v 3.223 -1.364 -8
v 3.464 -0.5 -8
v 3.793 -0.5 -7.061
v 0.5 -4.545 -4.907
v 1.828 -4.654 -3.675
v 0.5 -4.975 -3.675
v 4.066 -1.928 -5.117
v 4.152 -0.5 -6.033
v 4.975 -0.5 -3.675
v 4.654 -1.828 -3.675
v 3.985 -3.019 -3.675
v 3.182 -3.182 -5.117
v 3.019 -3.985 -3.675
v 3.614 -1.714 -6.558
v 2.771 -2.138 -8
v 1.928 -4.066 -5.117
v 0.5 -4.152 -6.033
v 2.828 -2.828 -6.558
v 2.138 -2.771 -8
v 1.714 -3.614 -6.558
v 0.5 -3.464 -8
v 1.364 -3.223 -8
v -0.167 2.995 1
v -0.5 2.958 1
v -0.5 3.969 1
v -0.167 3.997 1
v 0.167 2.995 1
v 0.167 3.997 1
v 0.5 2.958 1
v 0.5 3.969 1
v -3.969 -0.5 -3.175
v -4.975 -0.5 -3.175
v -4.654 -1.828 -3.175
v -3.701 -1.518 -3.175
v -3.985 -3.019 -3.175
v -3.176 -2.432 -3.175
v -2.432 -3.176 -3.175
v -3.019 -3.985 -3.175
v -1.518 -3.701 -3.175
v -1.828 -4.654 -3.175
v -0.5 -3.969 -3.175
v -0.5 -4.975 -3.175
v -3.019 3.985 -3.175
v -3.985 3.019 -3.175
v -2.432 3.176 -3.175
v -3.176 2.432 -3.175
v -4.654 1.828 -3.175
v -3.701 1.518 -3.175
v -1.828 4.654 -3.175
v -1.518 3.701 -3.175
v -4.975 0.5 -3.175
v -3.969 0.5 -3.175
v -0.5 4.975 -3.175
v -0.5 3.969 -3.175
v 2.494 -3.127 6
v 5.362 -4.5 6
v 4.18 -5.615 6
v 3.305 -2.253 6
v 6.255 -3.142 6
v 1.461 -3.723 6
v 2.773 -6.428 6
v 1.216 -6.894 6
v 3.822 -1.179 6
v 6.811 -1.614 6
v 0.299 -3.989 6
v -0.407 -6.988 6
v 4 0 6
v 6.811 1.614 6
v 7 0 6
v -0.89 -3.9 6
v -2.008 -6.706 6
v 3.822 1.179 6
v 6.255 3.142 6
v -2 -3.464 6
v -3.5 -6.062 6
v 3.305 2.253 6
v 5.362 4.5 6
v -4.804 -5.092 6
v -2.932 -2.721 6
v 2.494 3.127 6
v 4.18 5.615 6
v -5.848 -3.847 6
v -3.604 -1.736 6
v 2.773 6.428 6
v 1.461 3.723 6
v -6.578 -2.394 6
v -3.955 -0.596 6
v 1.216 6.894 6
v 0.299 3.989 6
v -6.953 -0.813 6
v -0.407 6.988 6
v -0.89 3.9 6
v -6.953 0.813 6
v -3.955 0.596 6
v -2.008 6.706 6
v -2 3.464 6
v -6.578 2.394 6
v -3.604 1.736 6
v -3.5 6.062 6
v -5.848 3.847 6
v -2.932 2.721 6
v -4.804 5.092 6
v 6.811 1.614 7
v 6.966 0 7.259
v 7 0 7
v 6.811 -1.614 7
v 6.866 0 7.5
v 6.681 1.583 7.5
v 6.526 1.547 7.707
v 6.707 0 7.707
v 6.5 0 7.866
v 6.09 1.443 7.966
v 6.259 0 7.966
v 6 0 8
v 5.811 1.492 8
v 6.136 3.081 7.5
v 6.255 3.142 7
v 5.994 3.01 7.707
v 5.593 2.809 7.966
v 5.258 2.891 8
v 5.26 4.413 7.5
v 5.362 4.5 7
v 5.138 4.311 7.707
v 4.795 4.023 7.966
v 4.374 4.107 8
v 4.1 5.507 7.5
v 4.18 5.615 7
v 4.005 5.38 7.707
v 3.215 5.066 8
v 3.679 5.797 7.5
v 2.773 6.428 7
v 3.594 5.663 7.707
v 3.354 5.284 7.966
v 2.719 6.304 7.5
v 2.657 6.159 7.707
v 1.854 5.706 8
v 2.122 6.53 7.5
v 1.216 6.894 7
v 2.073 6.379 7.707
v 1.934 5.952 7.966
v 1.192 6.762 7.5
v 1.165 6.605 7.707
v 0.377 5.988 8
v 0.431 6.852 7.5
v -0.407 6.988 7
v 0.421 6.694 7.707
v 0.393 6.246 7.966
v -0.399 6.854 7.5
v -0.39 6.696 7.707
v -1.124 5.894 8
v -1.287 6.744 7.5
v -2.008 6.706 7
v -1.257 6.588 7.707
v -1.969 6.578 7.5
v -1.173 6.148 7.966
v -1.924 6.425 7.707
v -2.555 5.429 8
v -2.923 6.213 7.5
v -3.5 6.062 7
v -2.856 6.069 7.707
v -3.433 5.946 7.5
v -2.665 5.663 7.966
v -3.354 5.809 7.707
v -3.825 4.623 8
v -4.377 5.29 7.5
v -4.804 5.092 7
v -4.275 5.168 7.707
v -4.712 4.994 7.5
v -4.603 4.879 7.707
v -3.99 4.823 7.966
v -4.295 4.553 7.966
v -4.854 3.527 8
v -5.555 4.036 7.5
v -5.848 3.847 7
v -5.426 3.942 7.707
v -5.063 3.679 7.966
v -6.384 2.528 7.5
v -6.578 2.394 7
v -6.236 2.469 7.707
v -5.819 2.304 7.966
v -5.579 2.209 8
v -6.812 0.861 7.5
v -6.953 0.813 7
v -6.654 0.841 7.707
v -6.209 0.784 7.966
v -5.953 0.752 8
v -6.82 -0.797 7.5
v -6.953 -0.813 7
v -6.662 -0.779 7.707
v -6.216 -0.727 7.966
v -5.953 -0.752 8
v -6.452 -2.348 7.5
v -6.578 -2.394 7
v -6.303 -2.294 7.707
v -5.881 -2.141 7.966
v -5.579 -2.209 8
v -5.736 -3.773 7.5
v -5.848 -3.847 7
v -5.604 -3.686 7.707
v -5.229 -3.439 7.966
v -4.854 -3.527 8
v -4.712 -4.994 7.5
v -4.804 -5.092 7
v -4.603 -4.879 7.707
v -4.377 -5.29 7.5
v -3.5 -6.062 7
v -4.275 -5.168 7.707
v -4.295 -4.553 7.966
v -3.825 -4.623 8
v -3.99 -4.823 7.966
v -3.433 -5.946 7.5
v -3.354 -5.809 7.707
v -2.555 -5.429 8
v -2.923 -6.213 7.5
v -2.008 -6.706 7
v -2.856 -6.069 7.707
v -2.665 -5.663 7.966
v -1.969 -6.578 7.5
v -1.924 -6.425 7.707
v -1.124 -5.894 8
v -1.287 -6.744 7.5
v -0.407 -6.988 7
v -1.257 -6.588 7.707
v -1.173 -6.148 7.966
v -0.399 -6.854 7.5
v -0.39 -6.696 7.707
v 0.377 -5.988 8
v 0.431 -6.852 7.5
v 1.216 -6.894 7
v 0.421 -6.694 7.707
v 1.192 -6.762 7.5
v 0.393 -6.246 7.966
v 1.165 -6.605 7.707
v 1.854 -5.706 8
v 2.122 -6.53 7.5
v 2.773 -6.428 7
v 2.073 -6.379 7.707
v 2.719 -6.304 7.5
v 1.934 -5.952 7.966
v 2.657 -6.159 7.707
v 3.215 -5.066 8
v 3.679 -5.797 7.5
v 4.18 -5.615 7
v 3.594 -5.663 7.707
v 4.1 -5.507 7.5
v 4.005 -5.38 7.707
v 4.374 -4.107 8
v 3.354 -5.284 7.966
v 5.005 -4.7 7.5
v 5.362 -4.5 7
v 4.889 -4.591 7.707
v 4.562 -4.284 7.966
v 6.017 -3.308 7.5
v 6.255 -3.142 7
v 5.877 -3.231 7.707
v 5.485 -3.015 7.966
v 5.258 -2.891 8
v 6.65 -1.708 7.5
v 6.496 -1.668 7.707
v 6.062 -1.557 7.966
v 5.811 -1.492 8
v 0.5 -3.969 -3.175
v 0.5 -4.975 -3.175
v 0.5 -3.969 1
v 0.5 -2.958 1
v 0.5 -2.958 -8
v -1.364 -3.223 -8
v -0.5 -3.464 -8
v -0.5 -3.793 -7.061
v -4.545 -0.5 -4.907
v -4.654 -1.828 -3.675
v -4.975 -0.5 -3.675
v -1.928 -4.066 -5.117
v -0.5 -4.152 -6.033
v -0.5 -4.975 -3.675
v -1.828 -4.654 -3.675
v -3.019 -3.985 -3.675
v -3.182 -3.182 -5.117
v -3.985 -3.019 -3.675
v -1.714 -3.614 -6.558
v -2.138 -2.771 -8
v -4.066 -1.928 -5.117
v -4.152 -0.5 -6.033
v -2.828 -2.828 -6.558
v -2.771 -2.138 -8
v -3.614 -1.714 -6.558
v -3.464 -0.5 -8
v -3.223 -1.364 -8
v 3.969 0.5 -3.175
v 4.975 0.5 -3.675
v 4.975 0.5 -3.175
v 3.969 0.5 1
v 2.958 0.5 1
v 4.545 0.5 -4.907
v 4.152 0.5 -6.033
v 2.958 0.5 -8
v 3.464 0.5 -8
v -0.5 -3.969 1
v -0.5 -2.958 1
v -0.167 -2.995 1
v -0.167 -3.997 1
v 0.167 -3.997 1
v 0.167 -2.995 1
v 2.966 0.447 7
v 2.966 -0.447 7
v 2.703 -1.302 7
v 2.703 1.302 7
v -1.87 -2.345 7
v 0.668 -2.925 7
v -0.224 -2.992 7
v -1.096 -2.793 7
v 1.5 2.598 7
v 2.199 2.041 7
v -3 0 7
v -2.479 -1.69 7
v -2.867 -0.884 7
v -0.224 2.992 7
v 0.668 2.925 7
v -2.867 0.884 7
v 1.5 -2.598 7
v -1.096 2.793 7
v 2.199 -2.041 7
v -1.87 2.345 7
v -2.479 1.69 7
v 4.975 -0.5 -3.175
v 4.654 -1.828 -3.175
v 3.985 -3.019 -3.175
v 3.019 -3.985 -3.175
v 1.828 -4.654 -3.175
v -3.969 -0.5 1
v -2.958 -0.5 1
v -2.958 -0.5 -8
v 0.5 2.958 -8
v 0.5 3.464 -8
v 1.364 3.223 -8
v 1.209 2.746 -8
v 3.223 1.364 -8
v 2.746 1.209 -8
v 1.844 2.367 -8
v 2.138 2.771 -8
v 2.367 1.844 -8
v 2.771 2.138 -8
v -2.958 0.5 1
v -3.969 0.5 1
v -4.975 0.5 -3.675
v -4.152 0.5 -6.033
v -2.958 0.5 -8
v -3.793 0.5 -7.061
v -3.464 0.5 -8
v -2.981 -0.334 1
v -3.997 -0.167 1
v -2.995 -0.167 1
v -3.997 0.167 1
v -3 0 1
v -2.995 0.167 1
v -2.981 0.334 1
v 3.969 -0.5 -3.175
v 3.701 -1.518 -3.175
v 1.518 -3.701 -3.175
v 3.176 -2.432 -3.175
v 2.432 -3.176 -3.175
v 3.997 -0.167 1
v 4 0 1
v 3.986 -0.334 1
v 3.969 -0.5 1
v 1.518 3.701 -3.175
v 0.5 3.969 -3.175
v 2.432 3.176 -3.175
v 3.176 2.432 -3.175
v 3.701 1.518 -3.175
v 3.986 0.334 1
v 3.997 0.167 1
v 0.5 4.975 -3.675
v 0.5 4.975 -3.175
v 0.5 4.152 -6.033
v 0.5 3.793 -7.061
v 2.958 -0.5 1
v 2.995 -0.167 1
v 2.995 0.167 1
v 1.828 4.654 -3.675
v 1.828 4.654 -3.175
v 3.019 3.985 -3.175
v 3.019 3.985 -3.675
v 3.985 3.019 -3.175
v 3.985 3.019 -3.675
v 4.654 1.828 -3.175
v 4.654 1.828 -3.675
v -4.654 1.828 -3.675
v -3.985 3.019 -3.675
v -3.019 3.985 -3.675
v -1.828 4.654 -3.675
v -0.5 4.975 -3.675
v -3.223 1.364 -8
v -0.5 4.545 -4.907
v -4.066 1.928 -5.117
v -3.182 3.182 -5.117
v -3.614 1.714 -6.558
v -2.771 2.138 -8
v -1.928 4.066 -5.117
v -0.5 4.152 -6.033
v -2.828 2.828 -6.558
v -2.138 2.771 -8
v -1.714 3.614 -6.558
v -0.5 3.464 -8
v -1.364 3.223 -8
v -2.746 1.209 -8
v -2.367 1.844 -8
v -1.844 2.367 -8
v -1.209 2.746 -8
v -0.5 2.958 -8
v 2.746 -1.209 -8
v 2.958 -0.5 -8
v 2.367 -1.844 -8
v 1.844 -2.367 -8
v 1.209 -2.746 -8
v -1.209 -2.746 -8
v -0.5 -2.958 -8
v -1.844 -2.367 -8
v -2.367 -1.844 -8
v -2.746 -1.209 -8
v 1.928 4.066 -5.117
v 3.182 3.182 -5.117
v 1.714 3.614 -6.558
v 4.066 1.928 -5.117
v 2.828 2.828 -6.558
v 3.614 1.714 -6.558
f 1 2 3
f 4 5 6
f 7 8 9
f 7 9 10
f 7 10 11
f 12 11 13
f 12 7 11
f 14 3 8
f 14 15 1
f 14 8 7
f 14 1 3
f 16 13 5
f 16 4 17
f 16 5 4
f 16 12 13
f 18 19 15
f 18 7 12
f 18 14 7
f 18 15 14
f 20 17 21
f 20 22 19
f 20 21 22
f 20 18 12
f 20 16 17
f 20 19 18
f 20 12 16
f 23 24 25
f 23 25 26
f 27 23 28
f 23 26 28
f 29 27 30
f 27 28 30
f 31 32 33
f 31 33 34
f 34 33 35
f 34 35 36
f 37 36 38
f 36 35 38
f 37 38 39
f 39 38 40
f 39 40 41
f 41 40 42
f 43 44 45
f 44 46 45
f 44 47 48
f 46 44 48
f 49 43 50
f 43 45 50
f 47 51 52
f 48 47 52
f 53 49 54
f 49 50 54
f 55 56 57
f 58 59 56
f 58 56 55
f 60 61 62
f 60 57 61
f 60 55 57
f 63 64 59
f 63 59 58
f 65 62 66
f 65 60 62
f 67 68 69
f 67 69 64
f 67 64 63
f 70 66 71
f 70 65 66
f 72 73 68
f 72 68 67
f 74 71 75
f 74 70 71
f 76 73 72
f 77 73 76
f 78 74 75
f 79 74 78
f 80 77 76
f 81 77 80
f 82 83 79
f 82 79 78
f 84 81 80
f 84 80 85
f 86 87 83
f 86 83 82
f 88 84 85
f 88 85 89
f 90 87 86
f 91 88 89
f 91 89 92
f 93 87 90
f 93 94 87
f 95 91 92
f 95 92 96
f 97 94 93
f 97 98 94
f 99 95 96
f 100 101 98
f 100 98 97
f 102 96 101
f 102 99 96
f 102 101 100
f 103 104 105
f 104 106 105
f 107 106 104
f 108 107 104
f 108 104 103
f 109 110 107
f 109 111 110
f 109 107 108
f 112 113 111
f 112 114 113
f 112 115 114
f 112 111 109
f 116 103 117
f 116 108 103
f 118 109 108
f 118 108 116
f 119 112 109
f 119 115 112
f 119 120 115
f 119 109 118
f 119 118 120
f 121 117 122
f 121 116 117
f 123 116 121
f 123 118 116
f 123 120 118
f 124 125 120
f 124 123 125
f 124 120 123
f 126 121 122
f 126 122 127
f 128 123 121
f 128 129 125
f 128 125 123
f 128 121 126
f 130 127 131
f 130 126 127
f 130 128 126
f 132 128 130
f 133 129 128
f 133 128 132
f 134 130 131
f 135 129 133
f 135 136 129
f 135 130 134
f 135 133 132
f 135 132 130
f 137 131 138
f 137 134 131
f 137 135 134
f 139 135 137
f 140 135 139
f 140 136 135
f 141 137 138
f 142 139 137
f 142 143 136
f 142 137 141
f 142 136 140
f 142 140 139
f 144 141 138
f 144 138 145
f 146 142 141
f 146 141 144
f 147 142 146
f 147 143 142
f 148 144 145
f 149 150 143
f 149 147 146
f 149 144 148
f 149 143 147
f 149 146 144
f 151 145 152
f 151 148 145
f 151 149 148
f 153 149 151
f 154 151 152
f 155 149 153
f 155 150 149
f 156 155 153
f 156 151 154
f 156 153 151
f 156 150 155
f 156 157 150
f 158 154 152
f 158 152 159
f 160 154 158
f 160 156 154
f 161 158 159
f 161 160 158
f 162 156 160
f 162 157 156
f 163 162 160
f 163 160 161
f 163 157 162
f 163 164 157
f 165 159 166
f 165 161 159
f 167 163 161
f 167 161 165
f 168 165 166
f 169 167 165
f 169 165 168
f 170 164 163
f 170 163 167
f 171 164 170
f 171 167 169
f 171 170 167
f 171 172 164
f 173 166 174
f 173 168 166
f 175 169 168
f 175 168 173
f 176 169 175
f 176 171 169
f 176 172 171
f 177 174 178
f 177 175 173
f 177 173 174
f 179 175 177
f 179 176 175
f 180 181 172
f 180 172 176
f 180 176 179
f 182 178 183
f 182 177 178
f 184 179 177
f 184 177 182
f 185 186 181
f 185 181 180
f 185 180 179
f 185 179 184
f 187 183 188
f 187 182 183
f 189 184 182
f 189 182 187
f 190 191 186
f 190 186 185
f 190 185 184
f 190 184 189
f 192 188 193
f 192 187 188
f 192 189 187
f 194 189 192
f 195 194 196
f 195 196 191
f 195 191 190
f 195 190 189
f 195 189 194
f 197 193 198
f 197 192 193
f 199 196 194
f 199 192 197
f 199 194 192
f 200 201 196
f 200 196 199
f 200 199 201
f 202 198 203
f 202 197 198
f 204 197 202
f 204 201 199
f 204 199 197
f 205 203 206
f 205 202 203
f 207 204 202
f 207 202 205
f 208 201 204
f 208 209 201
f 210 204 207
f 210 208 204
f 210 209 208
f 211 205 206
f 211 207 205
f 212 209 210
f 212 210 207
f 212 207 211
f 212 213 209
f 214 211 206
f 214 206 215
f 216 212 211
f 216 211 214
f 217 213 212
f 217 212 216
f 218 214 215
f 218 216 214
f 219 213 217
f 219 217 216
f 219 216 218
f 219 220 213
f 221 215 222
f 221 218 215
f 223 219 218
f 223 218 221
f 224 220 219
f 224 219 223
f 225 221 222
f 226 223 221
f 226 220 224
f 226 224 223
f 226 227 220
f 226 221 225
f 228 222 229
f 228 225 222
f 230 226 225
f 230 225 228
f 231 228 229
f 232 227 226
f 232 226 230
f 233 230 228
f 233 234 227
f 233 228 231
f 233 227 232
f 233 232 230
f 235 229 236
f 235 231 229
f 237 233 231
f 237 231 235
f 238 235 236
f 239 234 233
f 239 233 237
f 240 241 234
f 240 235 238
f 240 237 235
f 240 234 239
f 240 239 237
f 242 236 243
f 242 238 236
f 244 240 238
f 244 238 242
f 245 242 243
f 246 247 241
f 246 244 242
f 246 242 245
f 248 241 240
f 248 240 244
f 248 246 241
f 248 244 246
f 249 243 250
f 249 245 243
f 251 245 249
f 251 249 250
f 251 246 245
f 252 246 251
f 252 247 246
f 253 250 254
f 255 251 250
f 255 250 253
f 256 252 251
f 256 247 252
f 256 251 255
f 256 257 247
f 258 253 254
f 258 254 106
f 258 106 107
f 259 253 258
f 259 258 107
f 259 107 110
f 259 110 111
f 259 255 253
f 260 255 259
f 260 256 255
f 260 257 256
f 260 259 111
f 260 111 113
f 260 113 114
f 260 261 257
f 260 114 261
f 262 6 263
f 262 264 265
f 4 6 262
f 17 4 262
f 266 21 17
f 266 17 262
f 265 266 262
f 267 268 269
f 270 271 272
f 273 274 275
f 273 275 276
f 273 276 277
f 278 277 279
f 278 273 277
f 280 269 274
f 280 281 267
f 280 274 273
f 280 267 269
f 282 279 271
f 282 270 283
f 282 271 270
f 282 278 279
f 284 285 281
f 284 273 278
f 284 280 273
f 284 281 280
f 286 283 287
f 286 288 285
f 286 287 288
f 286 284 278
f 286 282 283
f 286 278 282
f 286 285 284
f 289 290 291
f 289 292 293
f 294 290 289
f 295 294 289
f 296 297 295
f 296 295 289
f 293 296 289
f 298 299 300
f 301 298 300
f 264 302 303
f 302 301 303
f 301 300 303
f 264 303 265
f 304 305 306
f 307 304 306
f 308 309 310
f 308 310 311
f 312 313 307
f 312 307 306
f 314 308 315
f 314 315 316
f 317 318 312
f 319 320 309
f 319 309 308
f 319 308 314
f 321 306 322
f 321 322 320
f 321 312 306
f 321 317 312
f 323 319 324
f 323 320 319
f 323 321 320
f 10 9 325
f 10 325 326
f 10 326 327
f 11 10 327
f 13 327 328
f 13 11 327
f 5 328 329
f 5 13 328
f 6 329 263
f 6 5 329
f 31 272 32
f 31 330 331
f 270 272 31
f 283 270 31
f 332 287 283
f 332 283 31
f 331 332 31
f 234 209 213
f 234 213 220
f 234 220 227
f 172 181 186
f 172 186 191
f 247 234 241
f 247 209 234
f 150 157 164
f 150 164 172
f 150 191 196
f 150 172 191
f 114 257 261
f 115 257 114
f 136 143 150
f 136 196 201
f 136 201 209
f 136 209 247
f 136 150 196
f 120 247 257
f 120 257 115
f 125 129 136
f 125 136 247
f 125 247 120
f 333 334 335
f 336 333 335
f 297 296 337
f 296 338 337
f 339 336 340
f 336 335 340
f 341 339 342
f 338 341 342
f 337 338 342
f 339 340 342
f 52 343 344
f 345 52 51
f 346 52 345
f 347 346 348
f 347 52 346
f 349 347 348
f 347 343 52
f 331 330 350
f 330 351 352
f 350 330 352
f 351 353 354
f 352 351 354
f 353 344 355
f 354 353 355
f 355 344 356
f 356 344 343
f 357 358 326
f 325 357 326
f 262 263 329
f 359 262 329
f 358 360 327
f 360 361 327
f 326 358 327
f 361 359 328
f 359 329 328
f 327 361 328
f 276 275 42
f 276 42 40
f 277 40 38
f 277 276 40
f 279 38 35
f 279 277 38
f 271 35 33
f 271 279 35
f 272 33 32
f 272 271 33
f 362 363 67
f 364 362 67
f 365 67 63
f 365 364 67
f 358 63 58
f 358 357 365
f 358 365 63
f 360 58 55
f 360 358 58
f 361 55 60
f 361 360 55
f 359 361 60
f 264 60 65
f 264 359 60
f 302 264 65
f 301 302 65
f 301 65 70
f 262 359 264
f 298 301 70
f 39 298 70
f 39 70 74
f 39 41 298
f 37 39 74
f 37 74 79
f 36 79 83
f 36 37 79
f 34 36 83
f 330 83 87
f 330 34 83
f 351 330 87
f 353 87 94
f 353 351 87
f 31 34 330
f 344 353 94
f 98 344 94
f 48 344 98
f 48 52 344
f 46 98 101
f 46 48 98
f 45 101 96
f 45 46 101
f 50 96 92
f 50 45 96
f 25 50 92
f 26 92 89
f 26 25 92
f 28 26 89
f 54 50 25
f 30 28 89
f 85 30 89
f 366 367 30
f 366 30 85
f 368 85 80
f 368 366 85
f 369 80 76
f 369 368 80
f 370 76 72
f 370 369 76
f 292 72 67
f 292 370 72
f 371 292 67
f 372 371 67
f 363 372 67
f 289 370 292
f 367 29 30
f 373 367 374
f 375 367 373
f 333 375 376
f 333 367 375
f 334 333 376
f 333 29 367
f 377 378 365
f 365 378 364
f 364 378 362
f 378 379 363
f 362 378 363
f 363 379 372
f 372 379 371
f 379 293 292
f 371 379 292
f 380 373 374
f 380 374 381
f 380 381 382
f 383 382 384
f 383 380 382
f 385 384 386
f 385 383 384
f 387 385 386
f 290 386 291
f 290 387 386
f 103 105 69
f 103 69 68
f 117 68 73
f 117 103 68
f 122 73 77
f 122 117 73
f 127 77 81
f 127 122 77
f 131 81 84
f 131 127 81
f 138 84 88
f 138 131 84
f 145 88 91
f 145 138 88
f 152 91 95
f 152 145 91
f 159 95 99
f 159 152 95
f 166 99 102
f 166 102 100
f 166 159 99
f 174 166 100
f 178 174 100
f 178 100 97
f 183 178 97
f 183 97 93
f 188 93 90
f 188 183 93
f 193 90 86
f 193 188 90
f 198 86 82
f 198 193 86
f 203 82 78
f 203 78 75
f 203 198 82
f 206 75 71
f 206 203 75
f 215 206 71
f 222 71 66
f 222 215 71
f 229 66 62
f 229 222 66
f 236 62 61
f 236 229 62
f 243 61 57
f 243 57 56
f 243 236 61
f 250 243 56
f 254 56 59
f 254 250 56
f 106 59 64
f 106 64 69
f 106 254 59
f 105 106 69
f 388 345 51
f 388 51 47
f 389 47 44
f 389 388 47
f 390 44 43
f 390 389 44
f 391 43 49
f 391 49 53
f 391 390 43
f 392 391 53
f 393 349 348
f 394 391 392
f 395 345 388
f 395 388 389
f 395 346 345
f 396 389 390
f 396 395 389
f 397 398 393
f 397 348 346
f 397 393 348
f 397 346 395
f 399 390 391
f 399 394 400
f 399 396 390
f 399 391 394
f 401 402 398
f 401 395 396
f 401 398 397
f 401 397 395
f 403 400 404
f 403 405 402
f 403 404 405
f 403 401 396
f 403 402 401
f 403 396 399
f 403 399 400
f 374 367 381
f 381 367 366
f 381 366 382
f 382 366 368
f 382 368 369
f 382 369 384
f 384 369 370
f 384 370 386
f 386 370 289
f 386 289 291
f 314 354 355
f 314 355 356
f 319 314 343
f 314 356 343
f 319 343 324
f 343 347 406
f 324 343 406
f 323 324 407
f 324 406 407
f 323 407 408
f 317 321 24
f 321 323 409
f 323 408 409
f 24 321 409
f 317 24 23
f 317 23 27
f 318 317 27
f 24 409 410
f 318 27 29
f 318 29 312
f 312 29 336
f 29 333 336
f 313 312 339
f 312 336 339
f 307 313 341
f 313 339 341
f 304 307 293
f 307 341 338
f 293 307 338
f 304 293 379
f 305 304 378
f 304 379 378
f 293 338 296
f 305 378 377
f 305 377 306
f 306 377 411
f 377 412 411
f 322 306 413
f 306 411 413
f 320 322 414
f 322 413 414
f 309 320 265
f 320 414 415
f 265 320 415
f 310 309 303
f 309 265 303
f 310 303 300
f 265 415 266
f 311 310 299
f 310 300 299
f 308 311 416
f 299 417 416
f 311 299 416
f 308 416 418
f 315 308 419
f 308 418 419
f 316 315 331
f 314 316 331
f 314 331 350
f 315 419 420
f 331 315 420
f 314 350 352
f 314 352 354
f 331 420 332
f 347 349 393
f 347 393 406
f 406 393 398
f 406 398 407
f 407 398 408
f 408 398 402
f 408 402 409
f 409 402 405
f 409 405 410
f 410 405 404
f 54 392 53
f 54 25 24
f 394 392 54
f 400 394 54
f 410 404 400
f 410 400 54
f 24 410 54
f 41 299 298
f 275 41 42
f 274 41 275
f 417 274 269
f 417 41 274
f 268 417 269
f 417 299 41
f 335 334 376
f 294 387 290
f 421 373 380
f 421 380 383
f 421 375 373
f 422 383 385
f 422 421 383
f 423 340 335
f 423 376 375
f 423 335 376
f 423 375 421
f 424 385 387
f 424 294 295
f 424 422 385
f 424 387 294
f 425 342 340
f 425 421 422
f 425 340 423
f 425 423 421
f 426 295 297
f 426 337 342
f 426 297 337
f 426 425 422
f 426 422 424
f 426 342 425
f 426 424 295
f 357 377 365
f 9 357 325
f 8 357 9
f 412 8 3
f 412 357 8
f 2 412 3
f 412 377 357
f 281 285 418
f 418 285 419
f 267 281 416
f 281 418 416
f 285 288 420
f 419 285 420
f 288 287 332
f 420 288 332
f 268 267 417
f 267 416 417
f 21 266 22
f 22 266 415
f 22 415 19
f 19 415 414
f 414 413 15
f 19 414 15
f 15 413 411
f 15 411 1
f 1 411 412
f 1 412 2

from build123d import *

# Parameters (mm, degrees)
SKETCH1_R           = 7
BOSS_EXTRUDE1_DEPTH = 8
SKETCH2_OUTSIDE_W   = 21.092
SKETCH2_OUTSIDE_H   = 21.092
SKETCH2_OUTSIDE_R   = 5
CUT_EXTRUDE1_DEPTH  = 14
SKETCH3_W           = 9
SKETCH3_H           = 9.175
SKETCH4_R           = 3
CUT_EXTRUDE2_DEPTH  = 15
CUT_EXTRUDE3_DEPTH  = 9
FILLET1_R           = 1


with BuildPart() as part:
    # Sketch1 → Boss-Extrude1 (new, symmetric)
    with BuildSketch(Plane.XY):
        Circle(SKETCH1_R)
    extrude(amount=BOSS_EXTRUDE1_DEPTH, both=True)

    # Sketch2 outside → Cut-Extrude1 (cut)
    with BuildSketch(Plane(origin=(0, 0, -8), x_dir=(-1, 0, 0), z_dir=(0, 0, -1))):
        Rectangle(SKETCH2_OUTSIDE_W, SKETCH2_OUTSIDE_H)
        Circle(SKETCH2_OUTSIDE_R, mode=Mode.SUBTRACT)
    extrude(amount=-CUT_EXTRUDE1_DEPTH, mode=Mode.SUBTRACT)

    # Sketch3 → Cut-Revolve1 (revolve, cut)
    with BuildSketch(Plane(origin=(0, 0, 0), x_dir=(1, 0, 0), z_dir=(0, 1, 0)), mode=Mode.PRIVATE) as cut_revolve1_sk:
        Polygon((-5, 3.675), (-3.5, 8), (-5, 8), align=None)
        with Locations((-8.5, -1.4125)):
            Rectangle(SKETCH3_W, SKETCH3_H)
    revolve(cut_revolve1_sk.sketch.rotate(Axis((0, 0, 6), (0, 0, -1)), 180), axis=Axis((0, 0, 6), (0, 0, -1)), mode=Mode.SUBTRACT)

    # Sketch4 → Cut-Extrude2 (cut)
    with BuildSketch(Plane(origin=(0, 0, -8), x_dir=(-1, 0, 0), z_dir=(0, 0, -1))):
        Circle(SKETCH4_R)
    extrude(amount=-CUT_EXTRUDE2_DEPTH, mode=Mode.SUBTRACT)

    # Sketch5 → Cut-Extrude3 (cut)
    with BuildSketch(Plane(origin=(0, 0, -8), x_dir=(-1, 0, 0), z_dir=(0, 0, -1))):
        Polygon((-0.5, 12), (0.5, 12), (0.5, 0.5), (12, 0.5), (12, -0.5), (0.5, -0.5), (0.5, -12), (-0.5, -12), (-0.5, -0.5), (-12, -0.5), (-12, 0.5), (-0.5, 0.5), align=None)
    extrude(amount=-CUT_EXTRUDE3_DEPTH, mode=Mode.SUBTRACT)

    # Fillet1
    fillet1_edges = [part.edges().sort_by_distance(p)[0] for p in [
        (-7, 0, 8),
    ]]
    fillet(fillet1_edges, radius=FILLET1_R)


solid = part.part
